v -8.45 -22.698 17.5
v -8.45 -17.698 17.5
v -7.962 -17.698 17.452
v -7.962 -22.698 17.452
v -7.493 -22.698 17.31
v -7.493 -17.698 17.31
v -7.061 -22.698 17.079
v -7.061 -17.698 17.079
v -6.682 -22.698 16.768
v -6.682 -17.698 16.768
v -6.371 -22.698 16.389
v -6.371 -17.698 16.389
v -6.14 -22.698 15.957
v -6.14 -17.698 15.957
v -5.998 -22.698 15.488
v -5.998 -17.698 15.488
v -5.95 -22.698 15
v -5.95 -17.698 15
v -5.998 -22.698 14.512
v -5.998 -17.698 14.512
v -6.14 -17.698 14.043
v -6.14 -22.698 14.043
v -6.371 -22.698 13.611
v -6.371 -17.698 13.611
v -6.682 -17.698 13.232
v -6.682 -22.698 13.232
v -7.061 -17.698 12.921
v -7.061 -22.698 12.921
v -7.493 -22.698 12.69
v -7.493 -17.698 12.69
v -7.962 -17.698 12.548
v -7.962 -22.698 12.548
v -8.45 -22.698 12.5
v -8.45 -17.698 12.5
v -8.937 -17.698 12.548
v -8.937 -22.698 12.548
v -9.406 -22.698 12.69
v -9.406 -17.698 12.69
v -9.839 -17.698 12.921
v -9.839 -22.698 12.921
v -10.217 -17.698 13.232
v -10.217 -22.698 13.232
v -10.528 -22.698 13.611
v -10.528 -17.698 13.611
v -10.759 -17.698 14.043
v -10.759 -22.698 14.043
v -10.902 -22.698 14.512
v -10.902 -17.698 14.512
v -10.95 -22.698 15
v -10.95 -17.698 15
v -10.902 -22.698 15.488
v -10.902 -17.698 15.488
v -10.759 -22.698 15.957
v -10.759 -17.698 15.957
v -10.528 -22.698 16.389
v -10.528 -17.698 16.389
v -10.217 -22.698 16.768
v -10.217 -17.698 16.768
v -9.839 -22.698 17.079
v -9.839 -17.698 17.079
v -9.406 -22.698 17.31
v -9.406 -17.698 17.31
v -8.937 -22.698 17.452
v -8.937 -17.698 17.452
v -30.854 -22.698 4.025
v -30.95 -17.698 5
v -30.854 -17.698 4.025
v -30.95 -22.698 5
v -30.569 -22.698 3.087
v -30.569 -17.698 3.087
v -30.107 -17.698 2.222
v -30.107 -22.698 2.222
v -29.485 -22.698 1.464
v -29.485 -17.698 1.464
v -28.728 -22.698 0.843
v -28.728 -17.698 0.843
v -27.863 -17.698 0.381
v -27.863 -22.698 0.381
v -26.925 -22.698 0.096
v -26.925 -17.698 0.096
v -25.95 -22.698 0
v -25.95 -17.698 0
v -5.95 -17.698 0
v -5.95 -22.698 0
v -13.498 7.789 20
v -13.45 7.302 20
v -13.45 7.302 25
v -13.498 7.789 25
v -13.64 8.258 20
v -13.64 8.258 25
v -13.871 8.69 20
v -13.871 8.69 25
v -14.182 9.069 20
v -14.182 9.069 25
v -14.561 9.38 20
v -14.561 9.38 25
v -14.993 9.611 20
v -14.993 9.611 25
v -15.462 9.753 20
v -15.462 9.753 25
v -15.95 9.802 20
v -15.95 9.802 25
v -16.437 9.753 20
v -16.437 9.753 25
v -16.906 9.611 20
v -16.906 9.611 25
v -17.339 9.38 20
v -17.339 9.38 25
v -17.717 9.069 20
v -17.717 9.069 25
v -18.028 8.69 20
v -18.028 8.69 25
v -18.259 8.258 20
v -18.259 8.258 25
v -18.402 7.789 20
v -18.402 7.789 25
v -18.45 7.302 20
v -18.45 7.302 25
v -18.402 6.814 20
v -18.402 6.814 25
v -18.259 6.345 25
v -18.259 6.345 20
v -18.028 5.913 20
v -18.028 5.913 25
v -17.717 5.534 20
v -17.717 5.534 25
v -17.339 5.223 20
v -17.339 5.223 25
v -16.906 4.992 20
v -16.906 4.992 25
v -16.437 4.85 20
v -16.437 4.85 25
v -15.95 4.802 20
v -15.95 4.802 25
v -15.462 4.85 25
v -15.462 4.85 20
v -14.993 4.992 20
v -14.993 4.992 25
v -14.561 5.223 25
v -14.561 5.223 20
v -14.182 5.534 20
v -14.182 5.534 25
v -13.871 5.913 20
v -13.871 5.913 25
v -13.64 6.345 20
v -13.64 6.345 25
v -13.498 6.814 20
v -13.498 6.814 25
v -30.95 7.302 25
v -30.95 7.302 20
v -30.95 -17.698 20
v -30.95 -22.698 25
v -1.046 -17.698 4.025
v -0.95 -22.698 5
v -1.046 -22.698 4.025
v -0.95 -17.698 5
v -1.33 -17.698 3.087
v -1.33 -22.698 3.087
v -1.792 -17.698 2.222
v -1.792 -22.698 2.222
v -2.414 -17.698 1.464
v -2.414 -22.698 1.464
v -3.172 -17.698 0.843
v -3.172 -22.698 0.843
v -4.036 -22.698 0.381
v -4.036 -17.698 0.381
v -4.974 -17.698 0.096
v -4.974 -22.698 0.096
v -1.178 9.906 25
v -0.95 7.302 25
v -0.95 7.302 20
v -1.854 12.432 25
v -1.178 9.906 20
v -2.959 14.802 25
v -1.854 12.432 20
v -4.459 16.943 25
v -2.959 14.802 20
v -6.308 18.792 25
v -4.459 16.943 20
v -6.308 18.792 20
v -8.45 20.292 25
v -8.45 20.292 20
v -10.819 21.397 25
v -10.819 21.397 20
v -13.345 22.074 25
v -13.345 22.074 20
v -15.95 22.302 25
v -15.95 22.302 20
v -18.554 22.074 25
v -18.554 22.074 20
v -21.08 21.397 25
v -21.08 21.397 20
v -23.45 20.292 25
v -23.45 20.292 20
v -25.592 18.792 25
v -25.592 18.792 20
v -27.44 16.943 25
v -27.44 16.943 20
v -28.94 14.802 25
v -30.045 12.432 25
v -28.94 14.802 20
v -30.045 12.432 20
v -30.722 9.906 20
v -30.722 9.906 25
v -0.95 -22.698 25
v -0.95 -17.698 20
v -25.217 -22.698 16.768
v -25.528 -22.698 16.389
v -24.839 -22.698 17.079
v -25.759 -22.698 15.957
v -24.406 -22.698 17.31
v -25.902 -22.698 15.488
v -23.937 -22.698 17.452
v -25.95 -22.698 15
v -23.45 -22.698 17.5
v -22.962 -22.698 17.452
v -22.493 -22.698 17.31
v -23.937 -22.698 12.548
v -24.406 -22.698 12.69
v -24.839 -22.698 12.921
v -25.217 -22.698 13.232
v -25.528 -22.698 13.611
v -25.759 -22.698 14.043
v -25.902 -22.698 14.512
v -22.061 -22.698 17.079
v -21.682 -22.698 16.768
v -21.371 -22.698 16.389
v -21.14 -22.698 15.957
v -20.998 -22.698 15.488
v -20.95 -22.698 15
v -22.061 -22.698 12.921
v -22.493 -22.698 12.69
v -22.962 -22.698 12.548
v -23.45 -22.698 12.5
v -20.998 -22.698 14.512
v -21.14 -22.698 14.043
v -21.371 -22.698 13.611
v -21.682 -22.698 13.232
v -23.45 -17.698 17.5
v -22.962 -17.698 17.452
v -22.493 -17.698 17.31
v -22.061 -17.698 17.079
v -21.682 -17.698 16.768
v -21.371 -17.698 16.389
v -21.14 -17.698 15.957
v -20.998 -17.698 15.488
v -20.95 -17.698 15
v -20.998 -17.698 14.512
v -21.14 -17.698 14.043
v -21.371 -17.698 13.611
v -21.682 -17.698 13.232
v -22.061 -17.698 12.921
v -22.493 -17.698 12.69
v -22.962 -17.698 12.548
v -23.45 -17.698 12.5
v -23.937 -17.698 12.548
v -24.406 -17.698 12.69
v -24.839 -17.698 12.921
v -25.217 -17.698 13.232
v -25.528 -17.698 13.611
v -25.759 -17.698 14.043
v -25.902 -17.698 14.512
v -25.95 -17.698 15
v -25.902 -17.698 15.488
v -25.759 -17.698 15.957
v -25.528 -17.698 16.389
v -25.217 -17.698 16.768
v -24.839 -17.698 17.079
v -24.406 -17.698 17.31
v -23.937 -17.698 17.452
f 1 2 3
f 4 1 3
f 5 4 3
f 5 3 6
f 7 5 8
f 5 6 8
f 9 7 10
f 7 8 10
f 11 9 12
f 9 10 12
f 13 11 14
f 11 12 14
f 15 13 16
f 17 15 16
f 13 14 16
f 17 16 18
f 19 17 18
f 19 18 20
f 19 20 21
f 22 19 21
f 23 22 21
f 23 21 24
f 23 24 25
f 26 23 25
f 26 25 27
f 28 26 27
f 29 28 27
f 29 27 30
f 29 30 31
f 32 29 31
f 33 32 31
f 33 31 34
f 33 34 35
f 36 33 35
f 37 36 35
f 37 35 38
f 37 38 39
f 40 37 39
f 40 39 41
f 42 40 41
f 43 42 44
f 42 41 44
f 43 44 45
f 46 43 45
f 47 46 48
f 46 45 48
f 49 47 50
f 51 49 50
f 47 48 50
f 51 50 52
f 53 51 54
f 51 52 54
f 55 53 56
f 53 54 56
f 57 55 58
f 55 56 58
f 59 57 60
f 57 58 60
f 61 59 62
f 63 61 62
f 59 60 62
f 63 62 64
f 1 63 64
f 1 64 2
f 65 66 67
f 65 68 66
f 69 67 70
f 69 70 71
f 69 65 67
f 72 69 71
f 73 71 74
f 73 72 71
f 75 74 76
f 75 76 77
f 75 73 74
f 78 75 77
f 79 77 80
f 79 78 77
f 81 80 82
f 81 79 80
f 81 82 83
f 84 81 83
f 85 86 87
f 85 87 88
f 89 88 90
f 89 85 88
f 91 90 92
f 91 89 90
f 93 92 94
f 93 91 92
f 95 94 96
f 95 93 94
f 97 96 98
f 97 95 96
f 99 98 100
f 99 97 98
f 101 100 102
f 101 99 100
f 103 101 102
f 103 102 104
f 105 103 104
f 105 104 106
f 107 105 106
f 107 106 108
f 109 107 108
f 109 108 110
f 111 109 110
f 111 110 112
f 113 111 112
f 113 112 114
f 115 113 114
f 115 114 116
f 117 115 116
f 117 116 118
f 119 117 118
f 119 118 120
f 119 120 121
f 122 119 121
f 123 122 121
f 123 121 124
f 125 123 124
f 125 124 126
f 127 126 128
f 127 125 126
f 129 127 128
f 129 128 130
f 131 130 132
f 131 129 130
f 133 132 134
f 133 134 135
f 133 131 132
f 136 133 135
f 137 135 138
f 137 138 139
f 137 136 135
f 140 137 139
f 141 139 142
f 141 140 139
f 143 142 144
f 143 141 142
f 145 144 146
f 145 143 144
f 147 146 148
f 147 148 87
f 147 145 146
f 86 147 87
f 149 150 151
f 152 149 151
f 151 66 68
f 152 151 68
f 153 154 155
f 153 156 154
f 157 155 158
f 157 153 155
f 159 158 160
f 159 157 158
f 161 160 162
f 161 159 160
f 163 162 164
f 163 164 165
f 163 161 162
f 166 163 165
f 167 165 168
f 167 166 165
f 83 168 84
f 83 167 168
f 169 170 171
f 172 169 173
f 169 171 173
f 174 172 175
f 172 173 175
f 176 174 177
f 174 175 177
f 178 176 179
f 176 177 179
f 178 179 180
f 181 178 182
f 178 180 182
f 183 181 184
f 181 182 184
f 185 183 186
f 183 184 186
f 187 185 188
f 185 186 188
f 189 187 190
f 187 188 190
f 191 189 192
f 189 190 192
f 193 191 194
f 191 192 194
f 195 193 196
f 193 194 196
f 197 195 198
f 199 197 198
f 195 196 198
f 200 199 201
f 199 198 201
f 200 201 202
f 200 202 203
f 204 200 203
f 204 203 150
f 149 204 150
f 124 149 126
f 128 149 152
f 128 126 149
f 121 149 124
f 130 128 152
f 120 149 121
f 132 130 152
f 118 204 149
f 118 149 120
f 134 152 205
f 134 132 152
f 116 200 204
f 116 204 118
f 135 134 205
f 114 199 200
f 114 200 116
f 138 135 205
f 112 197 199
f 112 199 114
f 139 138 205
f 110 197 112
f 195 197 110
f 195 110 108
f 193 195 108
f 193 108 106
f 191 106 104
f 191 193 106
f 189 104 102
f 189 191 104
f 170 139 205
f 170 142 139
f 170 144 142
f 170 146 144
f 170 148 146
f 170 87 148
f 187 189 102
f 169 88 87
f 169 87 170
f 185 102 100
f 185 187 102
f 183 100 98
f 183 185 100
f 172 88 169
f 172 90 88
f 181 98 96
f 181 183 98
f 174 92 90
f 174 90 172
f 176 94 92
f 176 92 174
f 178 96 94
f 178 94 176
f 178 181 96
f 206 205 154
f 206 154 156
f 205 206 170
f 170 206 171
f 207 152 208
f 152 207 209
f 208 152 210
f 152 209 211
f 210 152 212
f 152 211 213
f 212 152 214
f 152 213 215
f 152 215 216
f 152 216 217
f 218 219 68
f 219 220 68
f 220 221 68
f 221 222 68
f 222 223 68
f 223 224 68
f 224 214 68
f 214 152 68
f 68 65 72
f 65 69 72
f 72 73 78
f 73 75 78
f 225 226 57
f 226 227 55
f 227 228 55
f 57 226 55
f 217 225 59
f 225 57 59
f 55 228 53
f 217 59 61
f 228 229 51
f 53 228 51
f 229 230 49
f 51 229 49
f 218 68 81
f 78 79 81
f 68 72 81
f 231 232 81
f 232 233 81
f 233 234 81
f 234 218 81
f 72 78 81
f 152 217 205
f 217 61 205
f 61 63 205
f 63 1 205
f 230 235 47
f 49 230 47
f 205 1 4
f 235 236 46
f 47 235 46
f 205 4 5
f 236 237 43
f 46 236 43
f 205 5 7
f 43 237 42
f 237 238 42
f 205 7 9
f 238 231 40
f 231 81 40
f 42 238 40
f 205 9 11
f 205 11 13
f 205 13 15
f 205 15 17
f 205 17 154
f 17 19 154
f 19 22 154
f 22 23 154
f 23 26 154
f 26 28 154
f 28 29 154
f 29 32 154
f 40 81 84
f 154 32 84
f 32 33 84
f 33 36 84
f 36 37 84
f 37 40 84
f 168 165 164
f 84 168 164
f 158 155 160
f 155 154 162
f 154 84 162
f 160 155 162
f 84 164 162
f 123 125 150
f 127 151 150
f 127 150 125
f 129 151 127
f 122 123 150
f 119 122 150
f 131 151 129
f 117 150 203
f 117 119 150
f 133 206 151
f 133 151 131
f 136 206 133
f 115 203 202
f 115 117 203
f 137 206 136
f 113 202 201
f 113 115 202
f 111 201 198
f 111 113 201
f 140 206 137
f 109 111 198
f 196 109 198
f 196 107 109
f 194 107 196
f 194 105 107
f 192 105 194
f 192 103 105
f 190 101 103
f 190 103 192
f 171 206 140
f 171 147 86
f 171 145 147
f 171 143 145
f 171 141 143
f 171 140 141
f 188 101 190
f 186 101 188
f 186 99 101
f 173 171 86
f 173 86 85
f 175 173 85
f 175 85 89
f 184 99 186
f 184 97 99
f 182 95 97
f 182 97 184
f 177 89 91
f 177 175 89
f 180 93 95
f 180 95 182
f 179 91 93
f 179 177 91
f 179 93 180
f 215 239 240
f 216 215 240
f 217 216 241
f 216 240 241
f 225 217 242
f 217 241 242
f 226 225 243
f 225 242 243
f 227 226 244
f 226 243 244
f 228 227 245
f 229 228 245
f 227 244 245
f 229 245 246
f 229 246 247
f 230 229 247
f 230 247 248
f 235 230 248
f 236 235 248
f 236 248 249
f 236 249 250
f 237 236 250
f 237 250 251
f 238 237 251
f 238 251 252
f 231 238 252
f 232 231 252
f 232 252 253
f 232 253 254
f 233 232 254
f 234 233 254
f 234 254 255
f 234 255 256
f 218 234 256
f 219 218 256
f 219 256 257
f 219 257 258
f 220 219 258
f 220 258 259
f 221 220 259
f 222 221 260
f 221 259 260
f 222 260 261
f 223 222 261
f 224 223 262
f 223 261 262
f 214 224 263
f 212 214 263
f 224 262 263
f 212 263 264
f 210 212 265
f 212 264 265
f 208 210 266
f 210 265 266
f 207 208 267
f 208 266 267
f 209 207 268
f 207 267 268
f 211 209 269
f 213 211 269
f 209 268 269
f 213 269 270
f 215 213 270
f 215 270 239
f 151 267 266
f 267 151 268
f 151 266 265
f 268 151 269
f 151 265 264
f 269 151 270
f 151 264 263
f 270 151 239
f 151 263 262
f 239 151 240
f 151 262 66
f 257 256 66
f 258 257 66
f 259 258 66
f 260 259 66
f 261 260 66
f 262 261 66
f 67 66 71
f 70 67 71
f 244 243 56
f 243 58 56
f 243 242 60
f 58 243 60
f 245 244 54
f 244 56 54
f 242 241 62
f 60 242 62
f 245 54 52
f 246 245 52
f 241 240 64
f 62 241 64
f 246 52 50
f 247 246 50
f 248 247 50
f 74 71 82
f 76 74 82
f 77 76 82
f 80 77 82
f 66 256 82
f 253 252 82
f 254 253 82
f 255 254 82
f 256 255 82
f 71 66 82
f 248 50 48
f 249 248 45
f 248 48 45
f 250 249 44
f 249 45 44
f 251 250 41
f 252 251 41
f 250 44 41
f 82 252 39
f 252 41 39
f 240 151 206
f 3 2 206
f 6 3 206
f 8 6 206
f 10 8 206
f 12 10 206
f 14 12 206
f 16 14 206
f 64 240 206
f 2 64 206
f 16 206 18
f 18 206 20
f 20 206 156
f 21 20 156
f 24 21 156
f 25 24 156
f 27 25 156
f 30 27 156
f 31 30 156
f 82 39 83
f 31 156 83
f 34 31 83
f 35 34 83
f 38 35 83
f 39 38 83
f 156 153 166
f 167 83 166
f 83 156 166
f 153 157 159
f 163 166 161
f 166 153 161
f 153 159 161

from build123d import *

# Parameters (mm, degrees)
IZIM1_R                     = 2.5
Y_KSEKLIK_EKSTR_ZYON1_DEPTH = 25
IZIM2_W                     = 20
IZIM2_H                     = 40
KES_EKSTR_ZYON1_DEPTH       = 47
RADYUS1_R                   = 5
IZIM3_R                     = 2.5
KES_EKSTR_ZYON3_DEPTH       = 47


with BuildPart() as part:
    # Çizim1 → Yükseklik-Ekstrüzyon1 (new body)
    with BuildSketch(Plane.XY):
        with BuildLine():
            Line((-30.949719985, 7.301527432), (-30.949719985, -22.698472568))
            Line((-30.949719985, -22.698472568), (-0.949719985, -22.698472568))
            Line((-0.949719985, -22.698472568), (-0.949719985, 7.301527432))
            ThreePointArc((-0.949719985, 7.301527432), (-15.949719985, 22.301527432), (-30.949719985, 7.301527432))
        make_face()
        with Locations((-15.949719985, 7.301527432)):
            Circle(IZIM1_R, mode=Mode.SUBTRACT)
    extrude(amount=Y_KSEKLIK_EKSTR_ZYON1_DEPTH)

    # Çizim2 → Kes-Ekstrüzyon1 (cut)
    with BuildSketch(Plane(origin=(0, 0, 0), x_dir=(0, 0, -1), z_dir=(1, 0, 0))):
        with Locations((-10, 2.301527432)):
            Rectangle(IZIM2_W, IZIM2_H)
    extrude(amount=-KES_EKSTR_ZYON1_DEPTH, mode=Mode.SUBTRACT)

    # Radyus1
    radyus1_edges = [part.edges().sort_by_distance(p)[0] for p in [
        (-30.949719985, -20.198472568, 0),
        (-0.949719985, -20.198472568, 0),
    ]]
    fillet(radyus1_edges, radius=RADYUS1_R)

    # Çizim3 → Kes-Ekstrüzyon3 (cut)
    with BuildSketch(Plane(origin=(0, 0, 0), x_dir=(1, 0, 0), z_dir=(0, 1, 0))):
        with Locations(Location((-23.449719985, -15, 0), (0, 0, 270))):
            Circle(IZIM3_R)
        with Locations(Location((-8.449719985, -15, 0), (0, 0, 270))):
            Circle(IZIM3_R)
    extrude(amount=-KES_EKSTR_ZYON3_DEPTH, mode=Mode.SUBTRACT)


solid = part.part
